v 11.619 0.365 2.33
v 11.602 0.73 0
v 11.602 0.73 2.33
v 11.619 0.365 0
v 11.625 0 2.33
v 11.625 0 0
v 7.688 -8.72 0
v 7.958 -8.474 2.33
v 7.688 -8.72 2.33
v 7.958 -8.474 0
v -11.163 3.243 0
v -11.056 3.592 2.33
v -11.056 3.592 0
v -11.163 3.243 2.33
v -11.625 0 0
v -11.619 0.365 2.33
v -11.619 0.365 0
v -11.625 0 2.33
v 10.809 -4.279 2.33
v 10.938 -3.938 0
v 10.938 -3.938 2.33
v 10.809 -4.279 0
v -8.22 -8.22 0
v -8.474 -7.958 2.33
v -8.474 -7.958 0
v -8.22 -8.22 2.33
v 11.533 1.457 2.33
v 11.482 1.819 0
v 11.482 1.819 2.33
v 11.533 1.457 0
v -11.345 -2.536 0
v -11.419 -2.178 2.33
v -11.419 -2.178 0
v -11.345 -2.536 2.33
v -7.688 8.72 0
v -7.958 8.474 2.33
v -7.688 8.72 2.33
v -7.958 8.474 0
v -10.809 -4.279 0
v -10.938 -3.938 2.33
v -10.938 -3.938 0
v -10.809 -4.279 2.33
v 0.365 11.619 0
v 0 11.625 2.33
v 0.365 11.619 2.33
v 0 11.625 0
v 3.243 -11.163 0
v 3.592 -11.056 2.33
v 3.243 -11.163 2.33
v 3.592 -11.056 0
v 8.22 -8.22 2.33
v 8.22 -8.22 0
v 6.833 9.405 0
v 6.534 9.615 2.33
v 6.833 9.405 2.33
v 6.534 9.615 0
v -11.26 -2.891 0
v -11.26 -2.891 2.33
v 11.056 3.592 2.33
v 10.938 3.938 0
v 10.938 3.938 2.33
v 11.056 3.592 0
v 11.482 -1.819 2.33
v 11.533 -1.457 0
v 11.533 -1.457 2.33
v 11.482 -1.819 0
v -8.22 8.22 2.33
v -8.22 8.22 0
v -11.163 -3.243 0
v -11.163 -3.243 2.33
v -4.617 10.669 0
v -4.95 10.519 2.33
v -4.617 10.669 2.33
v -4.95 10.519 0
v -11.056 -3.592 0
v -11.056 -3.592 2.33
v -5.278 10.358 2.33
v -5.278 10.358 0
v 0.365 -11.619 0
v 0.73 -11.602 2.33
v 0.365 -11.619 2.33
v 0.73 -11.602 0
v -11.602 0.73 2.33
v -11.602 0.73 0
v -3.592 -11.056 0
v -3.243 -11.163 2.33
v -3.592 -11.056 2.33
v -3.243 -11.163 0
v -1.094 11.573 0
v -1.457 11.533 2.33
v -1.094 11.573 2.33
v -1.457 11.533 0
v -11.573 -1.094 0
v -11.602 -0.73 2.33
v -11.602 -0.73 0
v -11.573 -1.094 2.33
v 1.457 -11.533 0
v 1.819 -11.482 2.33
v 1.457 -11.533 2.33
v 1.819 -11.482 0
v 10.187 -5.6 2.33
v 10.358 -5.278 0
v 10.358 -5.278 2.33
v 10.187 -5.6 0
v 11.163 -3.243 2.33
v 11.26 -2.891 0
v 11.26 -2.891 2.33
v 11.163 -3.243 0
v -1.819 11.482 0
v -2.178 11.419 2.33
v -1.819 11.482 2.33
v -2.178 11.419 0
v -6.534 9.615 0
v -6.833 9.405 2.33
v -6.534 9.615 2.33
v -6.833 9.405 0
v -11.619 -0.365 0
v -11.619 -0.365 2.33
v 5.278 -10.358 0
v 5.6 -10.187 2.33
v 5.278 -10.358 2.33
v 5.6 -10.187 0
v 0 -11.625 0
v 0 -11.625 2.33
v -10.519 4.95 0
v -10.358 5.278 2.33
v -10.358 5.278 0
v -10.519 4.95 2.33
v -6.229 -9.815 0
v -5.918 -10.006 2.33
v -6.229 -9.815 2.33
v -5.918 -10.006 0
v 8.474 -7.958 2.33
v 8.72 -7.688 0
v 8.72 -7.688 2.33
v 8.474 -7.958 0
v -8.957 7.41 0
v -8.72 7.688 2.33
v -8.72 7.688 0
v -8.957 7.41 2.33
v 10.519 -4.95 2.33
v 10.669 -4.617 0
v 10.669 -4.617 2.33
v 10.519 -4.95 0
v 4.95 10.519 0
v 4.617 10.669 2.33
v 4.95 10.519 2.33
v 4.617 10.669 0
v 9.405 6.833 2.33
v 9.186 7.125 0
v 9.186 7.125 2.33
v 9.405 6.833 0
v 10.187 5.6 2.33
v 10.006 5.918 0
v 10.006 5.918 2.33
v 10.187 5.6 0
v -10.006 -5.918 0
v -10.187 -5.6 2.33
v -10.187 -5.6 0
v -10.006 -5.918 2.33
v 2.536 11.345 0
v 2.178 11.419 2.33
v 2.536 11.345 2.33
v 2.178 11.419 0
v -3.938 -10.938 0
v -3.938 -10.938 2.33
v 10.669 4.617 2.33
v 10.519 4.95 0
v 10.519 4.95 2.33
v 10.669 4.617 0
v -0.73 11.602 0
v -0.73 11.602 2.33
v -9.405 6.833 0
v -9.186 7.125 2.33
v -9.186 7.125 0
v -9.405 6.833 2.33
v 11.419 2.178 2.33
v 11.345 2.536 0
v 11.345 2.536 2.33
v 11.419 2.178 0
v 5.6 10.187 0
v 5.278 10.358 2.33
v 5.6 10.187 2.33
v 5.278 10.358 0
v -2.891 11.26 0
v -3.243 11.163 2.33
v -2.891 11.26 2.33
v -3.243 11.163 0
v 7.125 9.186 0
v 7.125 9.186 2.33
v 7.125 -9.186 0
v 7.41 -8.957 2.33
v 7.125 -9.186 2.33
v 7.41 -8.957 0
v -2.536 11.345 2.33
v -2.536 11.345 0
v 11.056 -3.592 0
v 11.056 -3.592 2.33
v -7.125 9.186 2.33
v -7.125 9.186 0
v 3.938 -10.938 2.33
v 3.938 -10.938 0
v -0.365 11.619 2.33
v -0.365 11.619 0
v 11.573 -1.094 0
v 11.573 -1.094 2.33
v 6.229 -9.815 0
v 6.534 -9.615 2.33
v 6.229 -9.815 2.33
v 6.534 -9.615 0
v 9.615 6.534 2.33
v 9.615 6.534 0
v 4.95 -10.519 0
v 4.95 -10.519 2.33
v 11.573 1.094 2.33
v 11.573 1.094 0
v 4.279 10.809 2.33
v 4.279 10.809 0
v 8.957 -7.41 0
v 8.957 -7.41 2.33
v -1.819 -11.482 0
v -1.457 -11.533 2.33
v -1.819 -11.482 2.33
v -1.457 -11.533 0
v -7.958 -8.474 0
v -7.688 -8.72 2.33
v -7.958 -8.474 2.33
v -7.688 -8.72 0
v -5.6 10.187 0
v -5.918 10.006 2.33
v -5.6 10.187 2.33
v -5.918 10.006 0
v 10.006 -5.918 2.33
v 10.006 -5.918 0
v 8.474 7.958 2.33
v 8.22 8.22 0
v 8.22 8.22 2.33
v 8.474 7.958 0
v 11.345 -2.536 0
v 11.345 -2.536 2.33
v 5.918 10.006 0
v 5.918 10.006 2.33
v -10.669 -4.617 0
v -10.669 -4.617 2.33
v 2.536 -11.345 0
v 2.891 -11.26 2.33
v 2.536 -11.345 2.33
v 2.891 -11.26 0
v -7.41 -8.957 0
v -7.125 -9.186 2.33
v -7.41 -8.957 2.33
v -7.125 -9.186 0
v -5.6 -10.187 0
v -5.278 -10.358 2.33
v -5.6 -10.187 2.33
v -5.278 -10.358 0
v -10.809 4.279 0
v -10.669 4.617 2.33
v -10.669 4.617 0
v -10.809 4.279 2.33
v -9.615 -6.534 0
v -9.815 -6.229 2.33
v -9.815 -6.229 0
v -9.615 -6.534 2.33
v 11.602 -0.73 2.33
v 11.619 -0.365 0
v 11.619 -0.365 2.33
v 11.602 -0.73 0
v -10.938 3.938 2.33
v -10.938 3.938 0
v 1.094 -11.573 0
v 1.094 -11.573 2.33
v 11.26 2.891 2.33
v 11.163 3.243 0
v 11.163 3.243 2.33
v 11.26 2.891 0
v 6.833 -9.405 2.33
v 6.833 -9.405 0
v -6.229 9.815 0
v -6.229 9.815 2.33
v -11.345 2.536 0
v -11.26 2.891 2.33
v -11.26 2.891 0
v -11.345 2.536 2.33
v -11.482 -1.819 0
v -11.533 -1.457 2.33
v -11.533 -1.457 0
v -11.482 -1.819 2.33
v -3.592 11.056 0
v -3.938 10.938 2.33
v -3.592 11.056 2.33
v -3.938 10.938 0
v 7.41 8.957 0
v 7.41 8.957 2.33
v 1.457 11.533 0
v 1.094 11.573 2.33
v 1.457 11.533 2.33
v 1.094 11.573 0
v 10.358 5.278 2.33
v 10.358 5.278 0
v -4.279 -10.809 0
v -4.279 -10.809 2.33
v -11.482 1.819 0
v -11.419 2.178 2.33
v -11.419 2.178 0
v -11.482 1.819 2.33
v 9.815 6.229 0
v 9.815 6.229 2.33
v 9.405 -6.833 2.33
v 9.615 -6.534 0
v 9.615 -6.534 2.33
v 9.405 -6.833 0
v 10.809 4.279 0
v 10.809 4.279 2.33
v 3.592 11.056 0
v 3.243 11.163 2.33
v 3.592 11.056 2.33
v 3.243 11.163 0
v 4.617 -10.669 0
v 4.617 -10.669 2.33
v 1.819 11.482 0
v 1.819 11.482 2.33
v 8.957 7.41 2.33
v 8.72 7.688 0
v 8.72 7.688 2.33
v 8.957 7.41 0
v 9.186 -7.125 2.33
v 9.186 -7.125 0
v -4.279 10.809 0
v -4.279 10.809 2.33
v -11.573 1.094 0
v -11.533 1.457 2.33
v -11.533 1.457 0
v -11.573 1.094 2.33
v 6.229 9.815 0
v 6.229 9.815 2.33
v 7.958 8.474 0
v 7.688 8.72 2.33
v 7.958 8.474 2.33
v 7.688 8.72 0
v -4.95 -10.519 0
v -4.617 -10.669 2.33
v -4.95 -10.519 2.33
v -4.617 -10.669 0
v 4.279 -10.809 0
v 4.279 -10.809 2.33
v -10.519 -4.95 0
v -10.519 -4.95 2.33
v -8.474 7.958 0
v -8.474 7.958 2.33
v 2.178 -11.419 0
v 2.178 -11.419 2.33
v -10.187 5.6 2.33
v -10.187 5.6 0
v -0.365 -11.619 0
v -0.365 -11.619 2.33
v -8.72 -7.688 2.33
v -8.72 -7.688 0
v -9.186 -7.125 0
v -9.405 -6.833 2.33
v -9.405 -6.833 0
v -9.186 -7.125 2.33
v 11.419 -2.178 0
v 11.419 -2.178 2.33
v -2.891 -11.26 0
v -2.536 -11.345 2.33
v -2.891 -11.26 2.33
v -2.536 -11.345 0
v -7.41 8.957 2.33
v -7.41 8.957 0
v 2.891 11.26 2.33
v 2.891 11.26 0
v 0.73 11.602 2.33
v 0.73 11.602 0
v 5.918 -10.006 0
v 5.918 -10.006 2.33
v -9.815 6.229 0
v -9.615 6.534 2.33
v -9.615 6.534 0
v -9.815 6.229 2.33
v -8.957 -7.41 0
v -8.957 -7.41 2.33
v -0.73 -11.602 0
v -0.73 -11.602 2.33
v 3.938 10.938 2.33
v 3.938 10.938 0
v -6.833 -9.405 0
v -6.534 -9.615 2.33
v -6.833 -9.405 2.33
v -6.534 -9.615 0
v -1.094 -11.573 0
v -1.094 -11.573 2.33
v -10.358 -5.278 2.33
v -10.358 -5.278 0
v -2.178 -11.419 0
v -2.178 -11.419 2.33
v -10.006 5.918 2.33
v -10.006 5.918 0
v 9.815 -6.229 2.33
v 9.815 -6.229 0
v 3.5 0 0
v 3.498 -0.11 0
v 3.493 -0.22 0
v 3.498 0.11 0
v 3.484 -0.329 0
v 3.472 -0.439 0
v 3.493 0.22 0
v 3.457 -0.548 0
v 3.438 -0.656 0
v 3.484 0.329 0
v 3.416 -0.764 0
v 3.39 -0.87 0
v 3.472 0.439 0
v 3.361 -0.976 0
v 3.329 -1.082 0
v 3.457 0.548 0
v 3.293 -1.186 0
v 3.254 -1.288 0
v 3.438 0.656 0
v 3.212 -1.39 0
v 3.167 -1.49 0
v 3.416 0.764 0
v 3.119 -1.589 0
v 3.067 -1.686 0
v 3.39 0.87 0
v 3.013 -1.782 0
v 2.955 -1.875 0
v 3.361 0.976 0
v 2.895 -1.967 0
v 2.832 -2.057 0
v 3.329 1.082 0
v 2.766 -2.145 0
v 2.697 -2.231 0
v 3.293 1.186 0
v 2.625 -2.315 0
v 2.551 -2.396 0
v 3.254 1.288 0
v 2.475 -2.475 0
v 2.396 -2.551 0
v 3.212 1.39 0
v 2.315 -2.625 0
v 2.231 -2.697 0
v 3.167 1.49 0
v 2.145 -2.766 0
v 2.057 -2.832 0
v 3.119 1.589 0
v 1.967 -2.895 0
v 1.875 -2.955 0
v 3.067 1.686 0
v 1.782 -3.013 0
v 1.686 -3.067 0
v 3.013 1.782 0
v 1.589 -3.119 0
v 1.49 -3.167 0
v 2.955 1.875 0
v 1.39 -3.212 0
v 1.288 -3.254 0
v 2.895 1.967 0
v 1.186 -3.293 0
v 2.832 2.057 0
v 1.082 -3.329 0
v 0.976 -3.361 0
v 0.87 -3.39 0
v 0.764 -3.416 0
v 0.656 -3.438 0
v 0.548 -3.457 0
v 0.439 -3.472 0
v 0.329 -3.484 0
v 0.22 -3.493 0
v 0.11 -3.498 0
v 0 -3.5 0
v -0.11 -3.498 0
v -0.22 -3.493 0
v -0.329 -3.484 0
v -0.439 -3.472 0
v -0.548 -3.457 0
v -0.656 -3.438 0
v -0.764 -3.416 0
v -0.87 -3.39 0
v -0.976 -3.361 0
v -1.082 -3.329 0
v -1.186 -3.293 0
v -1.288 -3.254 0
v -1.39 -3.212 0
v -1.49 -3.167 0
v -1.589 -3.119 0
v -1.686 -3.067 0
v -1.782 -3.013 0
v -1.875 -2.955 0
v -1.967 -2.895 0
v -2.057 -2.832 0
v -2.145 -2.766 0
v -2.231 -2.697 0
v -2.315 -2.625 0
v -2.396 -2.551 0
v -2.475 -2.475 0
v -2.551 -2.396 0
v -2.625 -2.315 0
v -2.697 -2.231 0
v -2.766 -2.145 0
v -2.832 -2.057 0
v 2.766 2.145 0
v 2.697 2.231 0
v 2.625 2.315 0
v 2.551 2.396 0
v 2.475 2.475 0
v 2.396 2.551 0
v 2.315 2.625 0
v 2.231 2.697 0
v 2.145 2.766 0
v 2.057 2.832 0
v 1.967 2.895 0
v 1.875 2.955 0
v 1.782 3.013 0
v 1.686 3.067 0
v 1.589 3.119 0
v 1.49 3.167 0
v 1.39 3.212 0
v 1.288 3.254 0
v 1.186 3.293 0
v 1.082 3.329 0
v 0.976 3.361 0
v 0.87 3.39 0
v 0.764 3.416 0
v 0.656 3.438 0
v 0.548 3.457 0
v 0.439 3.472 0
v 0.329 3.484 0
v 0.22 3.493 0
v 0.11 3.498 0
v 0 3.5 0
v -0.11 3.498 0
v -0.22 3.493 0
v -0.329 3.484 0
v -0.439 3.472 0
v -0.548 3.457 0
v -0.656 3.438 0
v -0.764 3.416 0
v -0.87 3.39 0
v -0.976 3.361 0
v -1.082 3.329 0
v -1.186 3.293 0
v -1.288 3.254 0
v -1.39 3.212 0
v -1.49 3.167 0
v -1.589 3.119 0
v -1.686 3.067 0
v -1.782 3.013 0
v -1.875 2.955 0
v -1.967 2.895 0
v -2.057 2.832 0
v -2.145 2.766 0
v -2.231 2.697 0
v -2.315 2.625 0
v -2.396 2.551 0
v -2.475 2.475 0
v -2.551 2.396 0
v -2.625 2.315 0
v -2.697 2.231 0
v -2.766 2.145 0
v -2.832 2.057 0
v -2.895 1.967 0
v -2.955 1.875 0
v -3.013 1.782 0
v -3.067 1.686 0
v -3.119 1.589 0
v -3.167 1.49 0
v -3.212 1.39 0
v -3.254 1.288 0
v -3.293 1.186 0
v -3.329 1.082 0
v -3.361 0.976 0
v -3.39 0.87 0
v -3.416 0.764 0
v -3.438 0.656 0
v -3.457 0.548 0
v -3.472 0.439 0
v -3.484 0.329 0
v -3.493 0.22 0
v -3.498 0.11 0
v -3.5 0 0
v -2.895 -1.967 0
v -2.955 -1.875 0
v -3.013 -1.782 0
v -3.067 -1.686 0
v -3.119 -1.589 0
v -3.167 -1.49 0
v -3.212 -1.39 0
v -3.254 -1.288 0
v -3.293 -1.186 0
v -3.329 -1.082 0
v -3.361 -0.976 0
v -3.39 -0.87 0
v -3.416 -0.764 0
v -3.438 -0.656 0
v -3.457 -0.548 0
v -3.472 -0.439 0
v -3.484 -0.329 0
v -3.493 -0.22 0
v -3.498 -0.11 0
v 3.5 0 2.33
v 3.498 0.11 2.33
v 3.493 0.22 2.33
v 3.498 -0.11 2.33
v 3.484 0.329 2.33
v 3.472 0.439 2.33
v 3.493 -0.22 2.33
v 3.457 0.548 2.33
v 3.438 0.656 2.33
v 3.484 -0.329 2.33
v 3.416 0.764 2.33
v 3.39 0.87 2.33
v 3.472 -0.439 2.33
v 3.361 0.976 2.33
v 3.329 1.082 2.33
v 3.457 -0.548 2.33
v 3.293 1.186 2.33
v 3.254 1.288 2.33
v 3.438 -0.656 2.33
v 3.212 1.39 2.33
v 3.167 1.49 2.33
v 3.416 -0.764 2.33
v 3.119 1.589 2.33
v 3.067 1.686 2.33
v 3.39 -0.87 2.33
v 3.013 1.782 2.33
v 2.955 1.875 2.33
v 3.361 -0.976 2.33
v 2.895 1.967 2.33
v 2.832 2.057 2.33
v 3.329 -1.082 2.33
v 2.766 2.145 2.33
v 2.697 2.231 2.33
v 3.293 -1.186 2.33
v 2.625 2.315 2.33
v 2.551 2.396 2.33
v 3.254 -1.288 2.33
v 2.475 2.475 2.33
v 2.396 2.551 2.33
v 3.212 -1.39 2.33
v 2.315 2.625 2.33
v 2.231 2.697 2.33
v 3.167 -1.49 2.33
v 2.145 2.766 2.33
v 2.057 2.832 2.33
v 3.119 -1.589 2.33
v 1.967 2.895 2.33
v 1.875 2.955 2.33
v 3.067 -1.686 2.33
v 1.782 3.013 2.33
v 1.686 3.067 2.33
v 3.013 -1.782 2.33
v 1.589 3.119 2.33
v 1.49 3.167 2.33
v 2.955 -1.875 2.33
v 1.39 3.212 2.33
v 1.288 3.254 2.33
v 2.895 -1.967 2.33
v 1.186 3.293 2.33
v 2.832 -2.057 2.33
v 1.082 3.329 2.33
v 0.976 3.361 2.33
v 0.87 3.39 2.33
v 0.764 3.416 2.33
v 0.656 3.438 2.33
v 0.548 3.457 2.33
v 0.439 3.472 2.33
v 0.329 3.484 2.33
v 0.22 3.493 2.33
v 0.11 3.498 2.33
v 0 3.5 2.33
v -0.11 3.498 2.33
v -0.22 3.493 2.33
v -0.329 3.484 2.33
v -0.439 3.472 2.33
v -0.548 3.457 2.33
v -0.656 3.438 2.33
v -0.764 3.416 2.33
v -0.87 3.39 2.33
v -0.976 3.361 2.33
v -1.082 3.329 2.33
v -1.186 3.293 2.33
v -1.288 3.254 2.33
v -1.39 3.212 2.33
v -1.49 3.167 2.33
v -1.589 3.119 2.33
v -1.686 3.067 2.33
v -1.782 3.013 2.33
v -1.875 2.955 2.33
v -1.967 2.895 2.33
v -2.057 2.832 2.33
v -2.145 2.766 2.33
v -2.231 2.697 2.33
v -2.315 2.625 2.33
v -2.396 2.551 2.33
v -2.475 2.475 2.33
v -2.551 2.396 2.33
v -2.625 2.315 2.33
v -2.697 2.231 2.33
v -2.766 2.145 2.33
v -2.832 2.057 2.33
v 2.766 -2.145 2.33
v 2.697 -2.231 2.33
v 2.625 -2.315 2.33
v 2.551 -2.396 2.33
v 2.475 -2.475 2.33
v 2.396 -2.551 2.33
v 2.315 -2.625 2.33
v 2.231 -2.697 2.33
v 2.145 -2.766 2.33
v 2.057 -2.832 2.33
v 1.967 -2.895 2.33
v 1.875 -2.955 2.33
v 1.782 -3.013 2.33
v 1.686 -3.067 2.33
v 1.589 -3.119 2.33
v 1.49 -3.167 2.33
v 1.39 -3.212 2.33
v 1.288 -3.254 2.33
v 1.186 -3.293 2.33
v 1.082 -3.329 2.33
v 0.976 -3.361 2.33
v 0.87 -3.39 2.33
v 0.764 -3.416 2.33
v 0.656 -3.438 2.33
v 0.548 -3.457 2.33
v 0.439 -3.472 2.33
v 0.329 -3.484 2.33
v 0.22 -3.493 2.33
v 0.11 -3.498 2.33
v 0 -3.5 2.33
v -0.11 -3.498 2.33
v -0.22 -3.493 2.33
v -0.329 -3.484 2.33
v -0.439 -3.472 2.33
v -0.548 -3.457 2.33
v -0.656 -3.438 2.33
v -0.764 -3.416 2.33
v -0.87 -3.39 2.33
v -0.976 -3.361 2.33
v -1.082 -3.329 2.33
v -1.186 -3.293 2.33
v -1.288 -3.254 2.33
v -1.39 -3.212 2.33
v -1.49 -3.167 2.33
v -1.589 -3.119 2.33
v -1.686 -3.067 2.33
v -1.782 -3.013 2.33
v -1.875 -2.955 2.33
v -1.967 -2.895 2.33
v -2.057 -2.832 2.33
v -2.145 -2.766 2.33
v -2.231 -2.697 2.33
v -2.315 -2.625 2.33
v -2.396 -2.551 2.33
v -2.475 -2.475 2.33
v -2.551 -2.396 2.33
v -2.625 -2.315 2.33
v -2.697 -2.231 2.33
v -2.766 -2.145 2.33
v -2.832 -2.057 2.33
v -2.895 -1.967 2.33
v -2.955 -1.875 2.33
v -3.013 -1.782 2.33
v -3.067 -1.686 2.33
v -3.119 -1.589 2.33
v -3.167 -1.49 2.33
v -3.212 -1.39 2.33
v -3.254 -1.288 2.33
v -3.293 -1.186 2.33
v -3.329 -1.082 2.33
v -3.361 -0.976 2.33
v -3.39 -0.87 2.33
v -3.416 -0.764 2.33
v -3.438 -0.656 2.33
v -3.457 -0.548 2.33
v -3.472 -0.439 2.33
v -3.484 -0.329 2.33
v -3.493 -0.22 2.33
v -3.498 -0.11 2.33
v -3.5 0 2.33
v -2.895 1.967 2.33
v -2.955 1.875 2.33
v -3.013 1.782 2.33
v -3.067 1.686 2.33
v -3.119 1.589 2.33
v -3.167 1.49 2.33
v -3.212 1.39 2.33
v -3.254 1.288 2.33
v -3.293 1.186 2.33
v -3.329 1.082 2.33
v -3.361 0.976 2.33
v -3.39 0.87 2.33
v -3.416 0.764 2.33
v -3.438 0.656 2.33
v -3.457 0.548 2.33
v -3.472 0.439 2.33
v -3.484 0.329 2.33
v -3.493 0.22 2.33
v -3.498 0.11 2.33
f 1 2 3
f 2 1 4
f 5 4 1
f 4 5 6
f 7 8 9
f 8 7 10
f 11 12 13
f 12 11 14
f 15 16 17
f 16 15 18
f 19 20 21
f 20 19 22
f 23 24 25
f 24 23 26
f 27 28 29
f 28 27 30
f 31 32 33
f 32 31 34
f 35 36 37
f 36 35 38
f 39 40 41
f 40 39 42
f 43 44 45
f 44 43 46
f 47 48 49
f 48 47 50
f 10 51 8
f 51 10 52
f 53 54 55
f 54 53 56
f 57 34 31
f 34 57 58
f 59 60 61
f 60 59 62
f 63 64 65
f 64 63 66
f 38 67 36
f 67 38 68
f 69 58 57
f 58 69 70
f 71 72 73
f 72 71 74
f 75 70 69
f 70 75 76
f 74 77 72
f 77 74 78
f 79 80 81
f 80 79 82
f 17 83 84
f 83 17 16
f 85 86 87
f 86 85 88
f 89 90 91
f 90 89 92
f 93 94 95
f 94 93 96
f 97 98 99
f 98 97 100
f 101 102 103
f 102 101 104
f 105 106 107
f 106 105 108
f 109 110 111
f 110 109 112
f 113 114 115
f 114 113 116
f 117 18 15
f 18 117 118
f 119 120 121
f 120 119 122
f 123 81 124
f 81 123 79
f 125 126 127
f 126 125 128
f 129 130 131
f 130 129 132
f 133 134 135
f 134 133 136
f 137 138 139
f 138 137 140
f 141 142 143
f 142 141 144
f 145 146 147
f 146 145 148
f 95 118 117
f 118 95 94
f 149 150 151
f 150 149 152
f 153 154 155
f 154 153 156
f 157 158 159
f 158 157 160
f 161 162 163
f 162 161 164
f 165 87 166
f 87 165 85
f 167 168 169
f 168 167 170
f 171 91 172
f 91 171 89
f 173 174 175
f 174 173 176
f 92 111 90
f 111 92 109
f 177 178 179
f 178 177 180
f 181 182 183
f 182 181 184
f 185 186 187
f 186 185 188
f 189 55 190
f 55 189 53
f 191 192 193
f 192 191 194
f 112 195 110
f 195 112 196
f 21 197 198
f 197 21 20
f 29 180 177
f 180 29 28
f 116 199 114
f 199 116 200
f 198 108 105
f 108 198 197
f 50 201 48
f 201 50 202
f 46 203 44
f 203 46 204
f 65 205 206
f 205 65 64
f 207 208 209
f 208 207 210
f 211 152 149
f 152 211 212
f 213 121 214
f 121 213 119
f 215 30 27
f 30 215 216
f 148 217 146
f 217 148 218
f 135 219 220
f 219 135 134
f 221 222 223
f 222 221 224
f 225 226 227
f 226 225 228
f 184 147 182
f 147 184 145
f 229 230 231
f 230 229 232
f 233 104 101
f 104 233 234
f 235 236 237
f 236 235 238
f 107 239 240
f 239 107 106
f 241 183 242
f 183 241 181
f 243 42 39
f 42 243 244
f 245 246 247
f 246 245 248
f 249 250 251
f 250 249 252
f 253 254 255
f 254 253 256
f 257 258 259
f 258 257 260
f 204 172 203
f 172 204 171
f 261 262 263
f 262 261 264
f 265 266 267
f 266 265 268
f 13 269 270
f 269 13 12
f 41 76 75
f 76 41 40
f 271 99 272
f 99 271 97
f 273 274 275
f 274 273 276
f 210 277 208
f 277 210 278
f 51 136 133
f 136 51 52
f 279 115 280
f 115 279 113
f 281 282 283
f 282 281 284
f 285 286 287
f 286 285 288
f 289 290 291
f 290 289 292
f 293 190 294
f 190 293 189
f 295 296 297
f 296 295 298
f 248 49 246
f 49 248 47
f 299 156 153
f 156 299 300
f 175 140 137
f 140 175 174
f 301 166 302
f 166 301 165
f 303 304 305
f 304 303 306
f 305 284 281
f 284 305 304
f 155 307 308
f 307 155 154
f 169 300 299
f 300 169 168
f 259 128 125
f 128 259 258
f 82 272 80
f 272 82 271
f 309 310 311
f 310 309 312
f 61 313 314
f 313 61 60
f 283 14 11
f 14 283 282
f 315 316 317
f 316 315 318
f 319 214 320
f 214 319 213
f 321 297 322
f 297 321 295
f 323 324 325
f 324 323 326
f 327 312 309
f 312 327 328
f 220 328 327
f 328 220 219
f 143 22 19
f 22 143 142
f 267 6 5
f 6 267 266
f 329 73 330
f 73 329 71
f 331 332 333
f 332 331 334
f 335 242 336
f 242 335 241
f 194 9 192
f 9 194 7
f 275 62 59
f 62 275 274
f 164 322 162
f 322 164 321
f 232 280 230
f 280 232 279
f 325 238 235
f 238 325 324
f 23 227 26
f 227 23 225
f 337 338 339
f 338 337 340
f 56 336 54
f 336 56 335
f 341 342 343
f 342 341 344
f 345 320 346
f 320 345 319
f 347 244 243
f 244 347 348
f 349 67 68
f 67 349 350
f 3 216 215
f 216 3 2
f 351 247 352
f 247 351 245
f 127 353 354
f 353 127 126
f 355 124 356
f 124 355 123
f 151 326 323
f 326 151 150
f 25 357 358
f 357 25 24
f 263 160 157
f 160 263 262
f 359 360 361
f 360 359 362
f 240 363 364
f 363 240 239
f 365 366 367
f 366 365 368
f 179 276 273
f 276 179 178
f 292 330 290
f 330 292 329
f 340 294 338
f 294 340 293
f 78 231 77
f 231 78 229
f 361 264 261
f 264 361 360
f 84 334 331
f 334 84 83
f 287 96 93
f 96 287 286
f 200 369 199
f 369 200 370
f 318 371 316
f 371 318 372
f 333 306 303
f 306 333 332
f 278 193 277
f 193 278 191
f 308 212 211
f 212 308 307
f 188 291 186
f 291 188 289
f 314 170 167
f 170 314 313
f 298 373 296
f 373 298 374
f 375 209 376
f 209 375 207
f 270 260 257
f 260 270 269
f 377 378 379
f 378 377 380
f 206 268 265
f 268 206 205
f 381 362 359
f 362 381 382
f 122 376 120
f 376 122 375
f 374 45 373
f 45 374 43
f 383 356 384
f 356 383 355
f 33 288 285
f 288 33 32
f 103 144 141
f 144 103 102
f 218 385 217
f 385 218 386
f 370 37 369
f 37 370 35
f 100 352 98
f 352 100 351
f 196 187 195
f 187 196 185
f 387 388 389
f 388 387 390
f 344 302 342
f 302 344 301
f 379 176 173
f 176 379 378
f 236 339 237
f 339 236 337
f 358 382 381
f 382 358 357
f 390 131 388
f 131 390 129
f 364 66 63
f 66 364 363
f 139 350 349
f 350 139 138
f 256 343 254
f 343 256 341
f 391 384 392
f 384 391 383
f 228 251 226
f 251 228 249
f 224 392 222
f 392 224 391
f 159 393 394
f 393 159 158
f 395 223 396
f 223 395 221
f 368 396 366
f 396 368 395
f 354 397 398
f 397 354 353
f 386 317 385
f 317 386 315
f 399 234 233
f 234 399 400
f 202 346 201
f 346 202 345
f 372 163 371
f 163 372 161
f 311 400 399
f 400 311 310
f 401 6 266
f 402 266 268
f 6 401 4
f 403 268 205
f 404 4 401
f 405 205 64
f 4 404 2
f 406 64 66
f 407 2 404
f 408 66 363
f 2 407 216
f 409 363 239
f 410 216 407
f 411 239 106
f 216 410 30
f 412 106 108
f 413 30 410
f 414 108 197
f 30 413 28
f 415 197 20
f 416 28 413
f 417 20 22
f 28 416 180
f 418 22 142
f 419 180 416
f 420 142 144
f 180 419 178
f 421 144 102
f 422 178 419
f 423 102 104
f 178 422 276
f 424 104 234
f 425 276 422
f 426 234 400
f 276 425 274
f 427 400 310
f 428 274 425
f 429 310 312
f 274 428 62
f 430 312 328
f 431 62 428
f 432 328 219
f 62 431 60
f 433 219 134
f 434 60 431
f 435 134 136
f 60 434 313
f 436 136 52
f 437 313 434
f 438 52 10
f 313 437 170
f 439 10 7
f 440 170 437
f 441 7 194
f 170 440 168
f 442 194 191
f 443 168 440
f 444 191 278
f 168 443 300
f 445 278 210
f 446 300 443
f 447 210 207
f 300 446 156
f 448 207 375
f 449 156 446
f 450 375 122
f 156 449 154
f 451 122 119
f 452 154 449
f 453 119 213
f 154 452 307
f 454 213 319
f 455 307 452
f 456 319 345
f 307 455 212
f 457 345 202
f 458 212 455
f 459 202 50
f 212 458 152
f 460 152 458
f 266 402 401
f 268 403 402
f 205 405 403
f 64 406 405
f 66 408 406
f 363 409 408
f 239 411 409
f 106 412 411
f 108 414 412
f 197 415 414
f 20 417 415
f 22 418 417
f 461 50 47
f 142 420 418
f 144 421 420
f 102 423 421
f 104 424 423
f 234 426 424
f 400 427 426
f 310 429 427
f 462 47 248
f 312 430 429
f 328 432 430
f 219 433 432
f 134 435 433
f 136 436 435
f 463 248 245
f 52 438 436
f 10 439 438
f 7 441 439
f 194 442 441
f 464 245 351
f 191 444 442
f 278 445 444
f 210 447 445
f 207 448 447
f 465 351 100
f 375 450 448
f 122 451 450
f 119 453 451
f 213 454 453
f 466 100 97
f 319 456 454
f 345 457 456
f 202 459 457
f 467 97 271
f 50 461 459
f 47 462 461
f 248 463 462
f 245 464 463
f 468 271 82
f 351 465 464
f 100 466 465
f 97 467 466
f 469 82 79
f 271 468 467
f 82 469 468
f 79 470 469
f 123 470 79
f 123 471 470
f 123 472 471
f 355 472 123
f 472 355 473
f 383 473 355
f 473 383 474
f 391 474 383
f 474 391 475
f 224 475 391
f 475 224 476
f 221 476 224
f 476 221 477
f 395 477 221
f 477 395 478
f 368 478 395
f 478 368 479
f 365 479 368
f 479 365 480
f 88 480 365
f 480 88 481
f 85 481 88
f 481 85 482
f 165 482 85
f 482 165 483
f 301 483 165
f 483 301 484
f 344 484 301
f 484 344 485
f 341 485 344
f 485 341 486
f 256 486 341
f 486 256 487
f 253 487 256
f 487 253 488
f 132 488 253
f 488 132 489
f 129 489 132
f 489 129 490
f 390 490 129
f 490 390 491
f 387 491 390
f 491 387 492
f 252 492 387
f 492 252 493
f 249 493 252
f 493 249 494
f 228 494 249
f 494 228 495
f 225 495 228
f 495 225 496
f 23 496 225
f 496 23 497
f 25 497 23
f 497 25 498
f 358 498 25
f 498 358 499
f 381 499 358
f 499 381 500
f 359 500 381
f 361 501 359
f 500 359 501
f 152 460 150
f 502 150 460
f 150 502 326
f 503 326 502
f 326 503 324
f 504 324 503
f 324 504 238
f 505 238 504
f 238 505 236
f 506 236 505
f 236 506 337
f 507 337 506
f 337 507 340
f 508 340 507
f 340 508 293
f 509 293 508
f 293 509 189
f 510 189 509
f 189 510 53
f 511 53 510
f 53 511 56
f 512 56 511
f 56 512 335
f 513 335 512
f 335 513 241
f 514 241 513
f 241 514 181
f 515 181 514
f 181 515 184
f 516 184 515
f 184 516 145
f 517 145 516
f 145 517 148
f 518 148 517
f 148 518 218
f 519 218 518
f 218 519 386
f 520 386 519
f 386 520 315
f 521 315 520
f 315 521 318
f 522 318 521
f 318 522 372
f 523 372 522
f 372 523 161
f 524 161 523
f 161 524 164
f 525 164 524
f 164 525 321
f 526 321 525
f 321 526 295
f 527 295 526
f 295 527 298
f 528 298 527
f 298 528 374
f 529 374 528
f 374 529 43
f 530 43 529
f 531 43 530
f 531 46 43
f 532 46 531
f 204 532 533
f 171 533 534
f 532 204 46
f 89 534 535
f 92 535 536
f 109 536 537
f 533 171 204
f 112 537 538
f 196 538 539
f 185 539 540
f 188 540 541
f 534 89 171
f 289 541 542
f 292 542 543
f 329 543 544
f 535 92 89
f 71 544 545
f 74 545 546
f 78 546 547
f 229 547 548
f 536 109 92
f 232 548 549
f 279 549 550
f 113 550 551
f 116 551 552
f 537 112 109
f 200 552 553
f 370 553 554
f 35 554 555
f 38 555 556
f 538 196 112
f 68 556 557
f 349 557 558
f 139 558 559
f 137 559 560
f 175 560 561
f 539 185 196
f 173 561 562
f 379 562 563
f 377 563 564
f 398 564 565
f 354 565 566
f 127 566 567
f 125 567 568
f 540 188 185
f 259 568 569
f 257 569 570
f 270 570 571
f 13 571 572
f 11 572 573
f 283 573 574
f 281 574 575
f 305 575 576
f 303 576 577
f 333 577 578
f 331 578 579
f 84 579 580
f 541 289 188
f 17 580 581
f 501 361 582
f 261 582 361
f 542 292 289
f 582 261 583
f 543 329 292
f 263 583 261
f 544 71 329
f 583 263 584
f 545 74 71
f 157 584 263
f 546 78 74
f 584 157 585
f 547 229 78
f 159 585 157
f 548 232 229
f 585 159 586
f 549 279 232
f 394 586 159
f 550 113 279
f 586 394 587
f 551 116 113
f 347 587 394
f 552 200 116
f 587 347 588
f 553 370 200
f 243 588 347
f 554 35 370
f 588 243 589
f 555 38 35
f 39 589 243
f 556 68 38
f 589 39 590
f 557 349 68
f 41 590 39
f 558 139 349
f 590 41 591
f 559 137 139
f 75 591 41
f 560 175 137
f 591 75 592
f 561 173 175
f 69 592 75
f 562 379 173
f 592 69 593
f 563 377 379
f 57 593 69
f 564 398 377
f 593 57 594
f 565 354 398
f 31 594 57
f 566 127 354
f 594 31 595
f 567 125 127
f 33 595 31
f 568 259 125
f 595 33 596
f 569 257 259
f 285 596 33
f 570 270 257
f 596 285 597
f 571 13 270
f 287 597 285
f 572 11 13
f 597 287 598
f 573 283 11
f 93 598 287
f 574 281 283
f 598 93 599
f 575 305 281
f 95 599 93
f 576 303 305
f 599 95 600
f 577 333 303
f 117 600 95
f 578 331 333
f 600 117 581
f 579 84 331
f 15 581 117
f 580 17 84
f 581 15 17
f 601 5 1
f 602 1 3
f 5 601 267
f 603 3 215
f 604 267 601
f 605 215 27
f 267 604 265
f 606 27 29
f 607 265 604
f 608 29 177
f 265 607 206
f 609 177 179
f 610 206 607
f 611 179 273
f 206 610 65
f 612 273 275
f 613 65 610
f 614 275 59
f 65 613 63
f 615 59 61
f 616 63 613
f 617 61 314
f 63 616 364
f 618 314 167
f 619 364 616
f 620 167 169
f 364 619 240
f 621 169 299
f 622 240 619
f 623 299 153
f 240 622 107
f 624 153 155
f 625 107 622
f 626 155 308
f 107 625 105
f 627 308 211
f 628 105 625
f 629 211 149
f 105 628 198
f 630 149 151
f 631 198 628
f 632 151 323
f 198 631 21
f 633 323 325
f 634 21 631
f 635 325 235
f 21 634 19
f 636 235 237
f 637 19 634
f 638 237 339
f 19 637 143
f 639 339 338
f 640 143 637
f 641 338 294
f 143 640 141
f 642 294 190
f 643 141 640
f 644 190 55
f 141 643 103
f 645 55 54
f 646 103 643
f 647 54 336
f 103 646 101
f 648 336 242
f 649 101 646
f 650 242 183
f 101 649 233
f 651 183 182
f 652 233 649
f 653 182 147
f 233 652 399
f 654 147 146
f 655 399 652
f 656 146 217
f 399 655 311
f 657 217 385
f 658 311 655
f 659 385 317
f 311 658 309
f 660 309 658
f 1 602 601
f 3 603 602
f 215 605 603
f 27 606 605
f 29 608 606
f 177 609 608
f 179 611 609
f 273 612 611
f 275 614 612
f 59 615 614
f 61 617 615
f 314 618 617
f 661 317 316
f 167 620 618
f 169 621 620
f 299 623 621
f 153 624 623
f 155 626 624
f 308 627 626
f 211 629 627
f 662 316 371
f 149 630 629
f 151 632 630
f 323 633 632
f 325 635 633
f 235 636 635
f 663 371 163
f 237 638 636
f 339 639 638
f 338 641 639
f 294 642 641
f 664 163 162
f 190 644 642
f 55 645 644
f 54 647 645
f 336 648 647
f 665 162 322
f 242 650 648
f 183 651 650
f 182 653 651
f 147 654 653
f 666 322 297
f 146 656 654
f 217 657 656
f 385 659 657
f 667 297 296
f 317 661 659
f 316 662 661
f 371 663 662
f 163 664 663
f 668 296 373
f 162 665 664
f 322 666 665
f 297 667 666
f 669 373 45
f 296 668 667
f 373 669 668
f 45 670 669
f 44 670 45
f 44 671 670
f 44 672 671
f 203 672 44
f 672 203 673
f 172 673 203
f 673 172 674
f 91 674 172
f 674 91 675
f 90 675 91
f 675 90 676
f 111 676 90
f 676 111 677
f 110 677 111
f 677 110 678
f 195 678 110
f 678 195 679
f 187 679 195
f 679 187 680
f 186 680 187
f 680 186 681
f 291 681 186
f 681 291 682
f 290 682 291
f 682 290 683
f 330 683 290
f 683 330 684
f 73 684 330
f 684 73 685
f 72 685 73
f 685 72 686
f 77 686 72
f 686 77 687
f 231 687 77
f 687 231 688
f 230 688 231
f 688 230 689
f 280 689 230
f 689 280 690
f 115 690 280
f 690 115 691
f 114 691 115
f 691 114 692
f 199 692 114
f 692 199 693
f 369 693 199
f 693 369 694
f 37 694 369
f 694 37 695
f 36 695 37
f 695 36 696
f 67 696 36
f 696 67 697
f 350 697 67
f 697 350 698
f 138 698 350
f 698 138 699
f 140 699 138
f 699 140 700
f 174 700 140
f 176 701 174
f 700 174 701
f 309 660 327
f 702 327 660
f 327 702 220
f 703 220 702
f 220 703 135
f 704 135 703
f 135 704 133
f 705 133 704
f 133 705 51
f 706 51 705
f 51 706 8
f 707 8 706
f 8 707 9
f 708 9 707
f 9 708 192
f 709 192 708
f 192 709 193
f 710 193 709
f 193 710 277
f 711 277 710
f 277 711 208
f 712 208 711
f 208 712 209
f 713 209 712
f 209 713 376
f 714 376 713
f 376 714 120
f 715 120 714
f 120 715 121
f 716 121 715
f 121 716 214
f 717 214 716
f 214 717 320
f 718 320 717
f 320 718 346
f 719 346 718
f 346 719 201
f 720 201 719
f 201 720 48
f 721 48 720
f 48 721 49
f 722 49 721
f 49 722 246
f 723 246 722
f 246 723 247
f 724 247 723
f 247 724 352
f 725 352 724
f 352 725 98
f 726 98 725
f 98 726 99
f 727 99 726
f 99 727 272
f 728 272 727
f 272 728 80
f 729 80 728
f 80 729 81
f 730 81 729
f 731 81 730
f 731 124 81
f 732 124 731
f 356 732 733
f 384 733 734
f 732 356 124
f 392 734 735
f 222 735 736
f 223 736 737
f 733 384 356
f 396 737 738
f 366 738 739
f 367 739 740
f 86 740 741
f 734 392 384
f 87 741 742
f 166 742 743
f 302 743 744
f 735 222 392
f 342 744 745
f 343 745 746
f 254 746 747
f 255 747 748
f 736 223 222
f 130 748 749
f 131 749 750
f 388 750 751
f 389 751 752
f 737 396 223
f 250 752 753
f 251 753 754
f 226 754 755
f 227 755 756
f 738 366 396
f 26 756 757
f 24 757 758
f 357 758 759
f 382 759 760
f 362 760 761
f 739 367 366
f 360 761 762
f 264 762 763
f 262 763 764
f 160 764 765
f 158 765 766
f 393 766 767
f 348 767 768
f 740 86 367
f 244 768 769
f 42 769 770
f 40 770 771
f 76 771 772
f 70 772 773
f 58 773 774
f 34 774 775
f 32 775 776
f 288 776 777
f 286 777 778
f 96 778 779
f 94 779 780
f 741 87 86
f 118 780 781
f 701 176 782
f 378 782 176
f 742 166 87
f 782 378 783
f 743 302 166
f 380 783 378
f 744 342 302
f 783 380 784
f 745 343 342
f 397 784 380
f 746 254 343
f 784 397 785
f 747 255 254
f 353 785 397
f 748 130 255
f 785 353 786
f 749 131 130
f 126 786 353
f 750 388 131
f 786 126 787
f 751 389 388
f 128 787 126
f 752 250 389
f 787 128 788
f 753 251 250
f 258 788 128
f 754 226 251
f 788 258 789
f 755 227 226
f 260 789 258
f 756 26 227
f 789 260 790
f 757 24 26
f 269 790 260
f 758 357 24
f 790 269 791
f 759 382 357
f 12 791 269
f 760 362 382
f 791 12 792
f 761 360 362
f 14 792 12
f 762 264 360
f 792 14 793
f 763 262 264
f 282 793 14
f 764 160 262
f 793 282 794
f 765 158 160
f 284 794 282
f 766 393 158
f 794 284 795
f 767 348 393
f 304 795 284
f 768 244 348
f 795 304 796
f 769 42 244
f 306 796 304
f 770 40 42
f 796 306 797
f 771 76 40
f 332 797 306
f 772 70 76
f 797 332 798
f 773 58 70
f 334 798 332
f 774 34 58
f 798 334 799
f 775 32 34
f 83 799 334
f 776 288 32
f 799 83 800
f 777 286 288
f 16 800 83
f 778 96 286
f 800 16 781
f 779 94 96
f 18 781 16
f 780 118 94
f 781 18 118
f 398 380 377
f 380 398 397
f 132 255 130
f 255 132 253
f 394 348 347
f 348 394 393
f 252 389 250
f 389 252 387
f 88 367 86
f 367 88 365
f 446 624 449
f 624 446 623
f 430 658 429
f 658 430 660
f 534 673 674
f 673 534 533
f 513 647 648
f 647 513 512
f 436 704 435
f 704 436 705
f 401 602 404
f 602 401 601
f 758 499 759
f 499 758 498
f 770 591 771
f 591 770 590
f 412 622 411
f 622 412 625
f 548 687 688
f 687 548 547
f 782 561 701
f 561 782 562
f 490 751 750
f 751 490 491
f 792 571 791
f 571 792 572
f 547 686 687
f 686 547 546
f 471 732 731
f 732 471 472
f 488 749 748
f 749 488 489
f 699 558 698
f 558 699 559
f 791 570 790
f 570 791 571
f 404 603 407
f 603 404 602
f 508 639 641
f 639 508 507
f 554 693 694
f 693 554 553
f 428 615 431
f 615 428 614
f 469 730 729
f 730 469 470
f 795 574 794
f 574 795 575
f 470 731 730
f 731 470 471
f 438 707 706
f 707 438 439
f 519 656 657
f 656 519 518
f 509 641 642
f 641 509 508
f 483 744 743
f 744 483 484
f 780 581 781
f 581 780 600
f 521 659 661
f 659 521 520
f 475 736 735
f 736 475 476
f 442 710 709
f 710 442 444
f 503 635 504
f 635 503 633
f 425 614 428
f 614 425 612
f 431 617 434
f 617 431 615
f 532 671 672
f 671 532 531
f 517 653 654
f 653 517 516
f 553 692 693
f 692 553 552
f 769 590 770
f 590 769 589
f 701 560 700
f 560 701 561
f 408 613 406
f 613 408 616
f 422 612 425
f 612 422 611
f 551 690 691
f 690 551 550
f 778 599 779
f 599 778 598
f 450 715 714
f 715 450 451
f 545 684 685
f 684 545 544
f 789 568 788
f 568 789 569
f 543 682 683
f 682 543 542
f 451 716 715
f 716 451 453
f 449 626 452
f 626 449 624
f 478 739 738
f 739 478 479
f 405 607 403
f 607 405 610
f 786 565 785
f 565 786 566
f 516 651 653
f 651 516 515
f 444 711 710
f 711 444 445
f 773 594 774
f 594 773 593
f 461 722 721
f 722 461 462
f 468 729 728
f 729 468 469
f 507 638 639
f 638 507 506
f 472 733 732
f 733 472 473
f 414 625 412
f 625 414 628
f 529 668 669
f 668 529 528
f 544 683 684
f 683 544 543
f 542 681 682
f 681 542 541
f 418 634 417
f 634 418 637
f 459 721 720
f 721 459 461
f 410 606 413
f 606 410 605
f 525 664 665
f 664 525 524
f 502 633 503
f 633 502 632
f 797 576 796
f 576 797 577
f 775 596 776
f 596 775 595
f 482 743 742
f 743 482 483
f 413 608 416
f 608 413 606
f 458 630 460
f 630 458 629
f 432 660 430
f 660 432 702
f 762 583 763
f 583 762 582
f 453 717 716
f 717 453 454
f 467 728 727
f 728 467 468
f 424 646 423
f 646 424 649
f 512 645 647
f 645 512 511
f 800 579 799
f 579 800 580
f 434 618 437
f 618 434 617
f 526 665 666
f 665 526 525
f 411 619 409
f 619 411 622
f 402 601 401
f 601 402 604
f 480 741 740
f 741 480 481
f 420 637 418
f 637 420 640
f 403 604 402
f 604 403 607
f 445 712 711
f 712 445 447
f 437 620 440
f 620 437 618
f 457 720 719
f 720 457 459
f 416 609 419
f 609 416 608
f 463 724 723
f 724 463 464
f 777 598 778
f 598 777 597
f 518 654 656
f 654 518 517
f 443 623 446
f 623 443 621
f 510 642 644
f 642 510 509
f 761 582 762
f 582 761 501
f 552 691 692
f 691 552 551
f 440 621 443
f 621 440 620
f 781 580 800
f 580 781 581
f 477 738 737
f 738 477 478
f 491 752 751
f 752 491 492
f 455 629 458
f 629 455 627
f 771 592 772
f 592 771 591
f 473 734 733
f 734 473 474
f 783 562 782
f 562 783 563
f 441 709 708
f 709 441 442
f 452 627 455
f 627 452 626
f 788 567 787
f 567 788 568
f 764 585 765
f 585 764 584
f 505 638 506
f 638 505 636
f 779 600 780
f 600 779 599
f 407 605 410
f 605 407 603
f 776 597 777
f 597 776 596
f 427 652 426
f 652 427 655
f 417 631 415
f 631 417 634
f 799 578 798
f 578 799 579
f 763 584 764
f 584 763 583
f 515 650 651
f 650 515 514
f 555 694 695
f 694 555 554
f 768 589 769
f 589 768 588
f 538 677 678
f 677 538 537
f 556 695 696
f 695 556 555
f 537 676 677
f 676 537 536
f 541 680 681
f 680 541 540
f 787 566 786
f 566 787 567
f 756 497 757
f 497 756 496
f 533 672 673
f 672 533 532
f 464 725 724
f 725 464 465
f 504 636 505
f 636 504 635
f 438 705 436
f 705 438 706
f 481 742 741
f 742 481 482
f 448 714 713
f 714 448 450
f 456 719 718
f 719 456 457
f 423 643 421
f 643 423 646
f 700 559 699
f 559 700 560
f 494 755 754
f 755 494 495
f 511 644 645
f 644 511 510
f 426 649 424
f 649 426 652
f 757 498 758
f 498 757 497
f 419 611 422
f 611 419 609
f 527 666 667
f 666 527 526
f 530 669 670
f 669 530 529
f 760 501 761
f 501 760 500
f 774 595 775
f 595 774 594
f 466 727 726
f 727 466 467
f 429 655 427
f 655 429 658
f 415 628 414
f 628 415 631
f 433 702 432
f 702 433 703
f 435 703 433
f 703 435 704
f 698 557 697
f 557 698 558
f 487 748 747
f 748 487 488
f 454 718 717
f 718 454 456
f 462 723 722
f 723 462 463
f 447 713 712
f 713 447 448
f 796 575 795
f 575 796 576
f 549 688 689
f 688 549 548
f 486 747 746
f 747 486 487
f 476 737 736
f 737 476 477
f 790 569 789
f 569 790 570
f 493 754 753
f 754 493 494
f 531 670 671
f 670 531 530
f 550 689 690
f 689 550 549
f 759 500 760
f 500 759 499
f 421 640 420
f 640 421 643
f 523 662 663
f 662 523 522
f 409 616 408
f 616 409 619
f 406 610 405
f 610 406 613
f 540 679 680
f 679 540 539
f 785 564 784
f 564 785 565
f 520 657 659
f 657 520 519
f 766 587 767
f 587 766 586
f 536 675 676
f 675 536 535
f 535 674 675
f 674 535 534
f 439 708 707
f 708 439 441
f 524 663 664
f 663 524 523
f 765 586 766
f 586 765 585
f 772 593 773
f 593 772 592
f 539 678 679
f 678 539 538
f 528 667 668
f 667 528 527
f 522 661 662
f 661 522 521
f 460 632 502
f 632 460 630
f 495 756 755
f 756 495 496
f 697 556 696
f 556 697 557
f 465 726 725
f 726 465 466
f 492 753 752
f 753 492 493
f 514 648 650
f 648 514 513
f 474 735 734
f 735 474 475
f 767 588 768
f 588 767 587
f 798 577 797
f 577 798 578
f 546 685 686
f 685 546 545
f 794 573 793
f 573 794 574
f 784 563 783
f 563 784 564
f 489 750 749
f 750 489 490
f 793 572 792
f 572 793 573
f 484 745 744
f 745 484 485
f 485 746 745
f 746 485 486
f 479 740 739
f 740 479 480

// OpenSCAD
$fn=200;

difference()
{
    cylinder(d=23.25, h=2.33);
    translate([0,0,-3])
    {
        cylinder(d=7,h=10);
    }
}
